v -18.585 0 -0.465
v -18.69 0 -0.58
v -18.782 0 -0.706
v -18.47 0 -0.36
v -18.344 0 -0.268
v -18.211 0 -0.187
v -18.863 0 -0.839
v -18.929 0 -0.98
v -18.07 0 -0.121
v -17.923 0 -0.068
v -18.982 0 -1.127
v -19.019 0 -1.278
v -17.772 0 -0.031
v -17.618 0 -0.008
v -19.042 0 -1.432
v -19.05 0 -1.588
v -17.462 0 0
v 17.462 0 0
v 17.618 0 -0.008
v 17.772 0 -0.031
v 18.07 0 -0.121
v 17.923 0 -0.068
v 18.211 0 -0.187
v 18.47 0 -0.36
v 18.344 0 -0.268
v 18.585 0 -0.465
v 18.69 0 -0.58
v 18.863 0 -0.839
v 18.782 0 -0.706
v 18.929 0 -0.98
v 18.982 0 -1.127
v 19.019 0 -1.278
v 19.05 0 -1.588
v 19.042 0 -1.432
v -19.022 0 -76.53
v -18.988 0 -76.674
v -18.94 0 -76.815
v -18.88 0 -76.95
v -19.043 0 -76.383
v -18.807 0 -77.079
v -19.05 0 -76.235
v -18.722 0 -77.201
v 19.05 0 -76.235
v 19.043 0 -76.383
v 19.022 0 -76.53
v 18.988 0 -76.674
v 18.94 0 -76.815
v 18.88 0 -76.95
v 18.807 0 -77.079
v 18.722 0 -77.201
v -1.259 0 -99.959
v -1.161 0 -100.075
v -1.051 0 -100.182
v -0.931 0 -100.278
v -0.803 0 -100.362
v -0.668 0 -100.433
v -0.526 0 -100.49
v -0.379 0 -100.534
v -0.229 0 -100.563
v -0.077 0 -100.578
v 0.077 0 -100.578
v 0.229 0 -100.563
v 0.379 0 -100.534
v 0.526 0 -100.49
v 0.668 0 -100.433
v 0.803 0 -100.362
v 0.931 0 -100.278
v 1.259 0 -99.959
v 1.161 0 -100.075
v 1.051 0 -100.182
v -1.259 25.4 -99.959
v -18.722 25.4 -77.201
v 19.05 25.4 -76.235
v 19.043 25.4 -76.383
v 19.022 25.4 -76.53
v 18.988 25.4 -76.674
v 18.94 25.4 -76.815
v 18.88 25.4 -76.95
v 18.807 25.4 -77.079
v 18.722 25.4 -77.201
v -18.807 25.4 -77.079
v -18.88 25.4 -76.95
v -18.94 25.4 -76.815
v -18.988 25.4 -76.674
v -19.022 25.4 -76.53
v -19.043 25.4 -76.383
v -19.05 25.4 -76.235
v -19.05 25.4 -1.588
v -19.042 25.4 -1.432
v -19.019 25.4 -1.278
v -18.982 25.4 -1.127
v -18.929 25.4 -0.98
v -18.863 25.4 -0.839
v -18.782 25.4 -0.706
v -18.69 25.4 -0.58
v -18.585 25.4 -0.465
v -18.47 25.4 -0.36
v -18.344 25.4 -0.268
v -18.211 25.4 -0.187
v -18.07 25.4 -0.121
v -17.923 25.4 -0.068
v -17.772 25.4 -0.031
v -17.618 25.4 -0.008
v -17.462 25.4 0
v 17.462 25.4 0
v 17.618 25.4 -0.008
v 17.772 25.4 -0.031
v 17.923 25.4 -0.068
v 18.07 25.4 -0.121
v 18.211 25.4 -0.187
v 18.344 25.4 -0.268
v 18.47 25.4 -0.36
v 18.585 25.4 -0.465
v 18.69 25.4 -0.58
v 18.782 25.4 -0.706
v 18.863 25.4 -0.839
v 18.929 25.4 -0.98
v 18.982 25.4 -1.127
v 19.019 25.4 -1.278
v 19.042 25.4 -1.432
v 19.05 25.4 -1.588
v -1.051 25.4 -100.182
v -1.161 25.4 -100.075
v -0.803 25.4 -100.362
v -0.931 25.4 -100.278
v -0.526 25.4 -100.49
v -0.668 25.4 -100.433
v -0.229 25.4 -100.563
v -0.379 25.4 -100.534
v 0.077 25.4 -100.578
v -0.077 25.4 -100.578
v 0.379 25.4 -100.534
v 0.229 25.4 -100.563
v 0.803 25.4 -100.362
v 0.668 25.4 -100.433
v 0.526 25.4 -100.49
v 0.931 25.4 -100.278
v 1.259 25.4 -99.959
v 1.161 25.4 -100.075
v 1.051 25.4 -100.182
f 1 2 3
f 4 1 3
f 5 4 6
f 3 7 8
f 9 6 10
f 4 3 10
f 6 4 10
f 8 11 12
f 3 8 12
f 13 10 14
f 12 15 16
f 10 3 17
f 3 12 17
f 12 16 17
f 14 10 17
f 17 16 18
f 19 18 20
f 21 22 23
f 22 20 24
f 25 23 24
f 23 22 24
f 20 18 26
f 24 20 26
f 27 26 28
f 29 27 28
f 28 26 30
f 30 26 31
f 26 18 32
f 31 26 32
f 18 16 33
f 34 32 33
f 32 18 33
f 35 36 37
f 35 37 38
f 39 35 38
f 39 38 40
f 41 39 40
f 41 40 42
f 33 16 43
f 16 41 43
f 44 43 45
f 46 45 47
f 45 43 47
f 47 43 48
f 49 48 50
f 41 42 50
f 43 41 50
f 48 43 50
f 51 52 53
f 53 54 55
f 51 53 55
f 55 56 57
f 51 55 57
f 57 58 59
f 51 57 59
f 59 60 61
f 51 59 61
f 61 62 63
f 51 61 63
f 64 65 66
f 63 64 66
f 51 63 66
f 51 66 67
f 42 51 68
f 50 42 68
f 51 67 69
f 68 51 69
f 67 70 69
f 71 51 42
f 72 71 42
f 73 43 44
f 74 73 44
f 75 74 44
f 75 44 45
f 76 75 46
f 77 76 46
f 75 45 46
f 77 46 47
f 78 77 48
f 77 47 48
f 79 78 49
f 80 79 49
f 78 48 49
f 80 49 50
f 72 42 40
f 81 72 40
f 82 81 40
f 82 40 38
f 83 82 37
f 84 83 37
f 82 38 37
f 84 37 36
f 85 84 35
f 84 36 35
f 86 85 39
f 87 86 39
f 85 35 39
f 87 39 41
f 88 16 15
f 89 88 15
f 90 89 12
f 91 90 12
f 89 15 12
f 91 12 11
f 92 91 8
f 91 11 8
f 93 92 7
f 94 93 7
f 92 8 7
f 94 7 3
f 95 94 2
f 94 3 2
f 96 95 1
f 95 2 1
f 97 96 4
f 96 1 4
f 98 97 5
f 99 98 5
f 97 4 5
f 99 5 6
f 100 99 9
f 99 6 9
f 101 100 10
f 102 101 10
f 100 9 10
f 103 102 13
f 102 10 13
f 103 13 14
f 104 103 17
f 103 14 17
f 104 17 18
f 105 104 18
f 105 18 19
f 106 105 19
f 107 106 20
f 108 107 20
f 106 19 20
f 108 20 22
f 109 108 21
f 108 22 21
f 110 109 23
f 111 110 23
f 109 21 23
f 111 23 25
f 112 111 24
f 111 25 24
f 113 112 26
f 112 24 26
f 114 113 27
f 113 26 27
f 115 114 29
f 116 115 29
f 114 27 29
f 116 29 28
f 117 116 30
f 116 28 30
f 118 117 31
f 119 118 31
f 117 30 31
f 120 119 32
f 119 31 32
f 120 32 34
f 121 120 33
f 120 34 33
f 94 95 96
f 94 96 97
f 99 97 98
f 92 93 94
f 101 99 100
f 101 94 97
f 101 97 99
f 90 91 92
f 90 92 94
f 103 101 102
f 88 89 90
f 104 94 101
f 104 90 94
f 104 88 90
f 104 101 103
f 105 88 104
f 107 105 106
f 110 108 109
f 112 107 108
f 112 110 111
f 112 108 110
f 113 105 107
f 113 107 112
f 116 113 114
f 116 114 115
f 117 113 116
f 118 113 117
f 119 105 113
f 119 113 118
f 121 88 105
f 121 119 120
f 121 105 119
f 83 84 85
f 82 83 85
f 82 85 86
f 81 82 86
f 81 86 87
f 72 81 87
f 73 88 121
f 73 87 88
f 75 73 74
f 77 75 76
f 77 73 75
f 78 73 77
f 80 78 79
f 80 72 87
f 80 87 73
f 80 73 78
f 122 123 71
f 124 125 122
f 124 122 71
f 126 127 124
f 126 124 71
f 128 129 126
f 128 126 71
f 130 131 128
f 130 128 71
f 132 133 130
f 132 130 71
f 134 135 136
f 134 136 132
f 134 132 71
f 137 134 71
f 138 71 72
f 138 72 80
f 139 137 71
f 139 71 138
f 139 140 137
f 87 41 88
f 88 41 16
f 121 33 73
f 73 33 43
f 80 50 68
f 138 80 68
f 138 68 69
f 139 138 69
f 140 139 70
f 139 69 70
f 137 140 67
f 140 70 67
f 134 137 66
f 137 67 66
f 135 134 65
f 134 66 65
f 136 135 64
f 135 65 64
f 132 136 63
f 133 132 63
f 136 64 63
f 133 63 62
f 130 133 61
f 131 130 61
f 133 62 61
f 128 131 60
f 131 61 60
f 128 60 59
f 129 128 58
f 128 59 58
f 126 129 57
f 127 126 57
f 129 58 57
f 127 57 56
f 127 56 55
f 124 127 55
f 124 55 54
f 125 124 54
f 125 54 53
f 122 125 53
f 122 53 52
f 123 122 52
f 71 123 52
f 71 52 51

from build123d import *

# Parameters (mm, degrees)
EXTRUDE1_DEPTH = 25.4


with BuildPart() as part:
    # Sketch1 → Extrude1 (new body)
    with BuildSketch(Plane(origin=(0, 0, 0), x_dir=(1, 0, 0), z_dir=(0, 1, 0))):
        with BuildLine():
            Line((-17.4625, 0), (17.4625, 0))
            ThreePointArc((17.4625, 0), (18.585032015, 0.464967985), (19.05, 1.5875))
            Line((19.05, 1.5875), (19.05, 76.234673011))
            ThreePointArc((19.05, 76.234673011), (18.965751581, 76.744958163), (18.721948428, 77.20108178))
            Line((18.721948428, 77.20108178), (1.259448428, 99.958654853))
            ThreePointArc((1.259448428, 99.958654853), (0, 100.579746085), (-1.259448428, 99.958654853))
            Line((-1.259448428, 99.958654853), (-18.721948428, 77.20108178))
            ThreePointArc((-18.721948428, 77.20108178), (-18.965751581, 76.744958163), (-19.05, 76.234673011))
            Line((-19.05, 76.234673011), (-19.05, 1.5875))
            ThreePointArc((-19.05, 1.5875), (-18.585032015, 0.464967985), (-17.4625, 0))
        make_face()
    extrude(amount=EXTRUDE1_DEPTH)


solid = part.part
